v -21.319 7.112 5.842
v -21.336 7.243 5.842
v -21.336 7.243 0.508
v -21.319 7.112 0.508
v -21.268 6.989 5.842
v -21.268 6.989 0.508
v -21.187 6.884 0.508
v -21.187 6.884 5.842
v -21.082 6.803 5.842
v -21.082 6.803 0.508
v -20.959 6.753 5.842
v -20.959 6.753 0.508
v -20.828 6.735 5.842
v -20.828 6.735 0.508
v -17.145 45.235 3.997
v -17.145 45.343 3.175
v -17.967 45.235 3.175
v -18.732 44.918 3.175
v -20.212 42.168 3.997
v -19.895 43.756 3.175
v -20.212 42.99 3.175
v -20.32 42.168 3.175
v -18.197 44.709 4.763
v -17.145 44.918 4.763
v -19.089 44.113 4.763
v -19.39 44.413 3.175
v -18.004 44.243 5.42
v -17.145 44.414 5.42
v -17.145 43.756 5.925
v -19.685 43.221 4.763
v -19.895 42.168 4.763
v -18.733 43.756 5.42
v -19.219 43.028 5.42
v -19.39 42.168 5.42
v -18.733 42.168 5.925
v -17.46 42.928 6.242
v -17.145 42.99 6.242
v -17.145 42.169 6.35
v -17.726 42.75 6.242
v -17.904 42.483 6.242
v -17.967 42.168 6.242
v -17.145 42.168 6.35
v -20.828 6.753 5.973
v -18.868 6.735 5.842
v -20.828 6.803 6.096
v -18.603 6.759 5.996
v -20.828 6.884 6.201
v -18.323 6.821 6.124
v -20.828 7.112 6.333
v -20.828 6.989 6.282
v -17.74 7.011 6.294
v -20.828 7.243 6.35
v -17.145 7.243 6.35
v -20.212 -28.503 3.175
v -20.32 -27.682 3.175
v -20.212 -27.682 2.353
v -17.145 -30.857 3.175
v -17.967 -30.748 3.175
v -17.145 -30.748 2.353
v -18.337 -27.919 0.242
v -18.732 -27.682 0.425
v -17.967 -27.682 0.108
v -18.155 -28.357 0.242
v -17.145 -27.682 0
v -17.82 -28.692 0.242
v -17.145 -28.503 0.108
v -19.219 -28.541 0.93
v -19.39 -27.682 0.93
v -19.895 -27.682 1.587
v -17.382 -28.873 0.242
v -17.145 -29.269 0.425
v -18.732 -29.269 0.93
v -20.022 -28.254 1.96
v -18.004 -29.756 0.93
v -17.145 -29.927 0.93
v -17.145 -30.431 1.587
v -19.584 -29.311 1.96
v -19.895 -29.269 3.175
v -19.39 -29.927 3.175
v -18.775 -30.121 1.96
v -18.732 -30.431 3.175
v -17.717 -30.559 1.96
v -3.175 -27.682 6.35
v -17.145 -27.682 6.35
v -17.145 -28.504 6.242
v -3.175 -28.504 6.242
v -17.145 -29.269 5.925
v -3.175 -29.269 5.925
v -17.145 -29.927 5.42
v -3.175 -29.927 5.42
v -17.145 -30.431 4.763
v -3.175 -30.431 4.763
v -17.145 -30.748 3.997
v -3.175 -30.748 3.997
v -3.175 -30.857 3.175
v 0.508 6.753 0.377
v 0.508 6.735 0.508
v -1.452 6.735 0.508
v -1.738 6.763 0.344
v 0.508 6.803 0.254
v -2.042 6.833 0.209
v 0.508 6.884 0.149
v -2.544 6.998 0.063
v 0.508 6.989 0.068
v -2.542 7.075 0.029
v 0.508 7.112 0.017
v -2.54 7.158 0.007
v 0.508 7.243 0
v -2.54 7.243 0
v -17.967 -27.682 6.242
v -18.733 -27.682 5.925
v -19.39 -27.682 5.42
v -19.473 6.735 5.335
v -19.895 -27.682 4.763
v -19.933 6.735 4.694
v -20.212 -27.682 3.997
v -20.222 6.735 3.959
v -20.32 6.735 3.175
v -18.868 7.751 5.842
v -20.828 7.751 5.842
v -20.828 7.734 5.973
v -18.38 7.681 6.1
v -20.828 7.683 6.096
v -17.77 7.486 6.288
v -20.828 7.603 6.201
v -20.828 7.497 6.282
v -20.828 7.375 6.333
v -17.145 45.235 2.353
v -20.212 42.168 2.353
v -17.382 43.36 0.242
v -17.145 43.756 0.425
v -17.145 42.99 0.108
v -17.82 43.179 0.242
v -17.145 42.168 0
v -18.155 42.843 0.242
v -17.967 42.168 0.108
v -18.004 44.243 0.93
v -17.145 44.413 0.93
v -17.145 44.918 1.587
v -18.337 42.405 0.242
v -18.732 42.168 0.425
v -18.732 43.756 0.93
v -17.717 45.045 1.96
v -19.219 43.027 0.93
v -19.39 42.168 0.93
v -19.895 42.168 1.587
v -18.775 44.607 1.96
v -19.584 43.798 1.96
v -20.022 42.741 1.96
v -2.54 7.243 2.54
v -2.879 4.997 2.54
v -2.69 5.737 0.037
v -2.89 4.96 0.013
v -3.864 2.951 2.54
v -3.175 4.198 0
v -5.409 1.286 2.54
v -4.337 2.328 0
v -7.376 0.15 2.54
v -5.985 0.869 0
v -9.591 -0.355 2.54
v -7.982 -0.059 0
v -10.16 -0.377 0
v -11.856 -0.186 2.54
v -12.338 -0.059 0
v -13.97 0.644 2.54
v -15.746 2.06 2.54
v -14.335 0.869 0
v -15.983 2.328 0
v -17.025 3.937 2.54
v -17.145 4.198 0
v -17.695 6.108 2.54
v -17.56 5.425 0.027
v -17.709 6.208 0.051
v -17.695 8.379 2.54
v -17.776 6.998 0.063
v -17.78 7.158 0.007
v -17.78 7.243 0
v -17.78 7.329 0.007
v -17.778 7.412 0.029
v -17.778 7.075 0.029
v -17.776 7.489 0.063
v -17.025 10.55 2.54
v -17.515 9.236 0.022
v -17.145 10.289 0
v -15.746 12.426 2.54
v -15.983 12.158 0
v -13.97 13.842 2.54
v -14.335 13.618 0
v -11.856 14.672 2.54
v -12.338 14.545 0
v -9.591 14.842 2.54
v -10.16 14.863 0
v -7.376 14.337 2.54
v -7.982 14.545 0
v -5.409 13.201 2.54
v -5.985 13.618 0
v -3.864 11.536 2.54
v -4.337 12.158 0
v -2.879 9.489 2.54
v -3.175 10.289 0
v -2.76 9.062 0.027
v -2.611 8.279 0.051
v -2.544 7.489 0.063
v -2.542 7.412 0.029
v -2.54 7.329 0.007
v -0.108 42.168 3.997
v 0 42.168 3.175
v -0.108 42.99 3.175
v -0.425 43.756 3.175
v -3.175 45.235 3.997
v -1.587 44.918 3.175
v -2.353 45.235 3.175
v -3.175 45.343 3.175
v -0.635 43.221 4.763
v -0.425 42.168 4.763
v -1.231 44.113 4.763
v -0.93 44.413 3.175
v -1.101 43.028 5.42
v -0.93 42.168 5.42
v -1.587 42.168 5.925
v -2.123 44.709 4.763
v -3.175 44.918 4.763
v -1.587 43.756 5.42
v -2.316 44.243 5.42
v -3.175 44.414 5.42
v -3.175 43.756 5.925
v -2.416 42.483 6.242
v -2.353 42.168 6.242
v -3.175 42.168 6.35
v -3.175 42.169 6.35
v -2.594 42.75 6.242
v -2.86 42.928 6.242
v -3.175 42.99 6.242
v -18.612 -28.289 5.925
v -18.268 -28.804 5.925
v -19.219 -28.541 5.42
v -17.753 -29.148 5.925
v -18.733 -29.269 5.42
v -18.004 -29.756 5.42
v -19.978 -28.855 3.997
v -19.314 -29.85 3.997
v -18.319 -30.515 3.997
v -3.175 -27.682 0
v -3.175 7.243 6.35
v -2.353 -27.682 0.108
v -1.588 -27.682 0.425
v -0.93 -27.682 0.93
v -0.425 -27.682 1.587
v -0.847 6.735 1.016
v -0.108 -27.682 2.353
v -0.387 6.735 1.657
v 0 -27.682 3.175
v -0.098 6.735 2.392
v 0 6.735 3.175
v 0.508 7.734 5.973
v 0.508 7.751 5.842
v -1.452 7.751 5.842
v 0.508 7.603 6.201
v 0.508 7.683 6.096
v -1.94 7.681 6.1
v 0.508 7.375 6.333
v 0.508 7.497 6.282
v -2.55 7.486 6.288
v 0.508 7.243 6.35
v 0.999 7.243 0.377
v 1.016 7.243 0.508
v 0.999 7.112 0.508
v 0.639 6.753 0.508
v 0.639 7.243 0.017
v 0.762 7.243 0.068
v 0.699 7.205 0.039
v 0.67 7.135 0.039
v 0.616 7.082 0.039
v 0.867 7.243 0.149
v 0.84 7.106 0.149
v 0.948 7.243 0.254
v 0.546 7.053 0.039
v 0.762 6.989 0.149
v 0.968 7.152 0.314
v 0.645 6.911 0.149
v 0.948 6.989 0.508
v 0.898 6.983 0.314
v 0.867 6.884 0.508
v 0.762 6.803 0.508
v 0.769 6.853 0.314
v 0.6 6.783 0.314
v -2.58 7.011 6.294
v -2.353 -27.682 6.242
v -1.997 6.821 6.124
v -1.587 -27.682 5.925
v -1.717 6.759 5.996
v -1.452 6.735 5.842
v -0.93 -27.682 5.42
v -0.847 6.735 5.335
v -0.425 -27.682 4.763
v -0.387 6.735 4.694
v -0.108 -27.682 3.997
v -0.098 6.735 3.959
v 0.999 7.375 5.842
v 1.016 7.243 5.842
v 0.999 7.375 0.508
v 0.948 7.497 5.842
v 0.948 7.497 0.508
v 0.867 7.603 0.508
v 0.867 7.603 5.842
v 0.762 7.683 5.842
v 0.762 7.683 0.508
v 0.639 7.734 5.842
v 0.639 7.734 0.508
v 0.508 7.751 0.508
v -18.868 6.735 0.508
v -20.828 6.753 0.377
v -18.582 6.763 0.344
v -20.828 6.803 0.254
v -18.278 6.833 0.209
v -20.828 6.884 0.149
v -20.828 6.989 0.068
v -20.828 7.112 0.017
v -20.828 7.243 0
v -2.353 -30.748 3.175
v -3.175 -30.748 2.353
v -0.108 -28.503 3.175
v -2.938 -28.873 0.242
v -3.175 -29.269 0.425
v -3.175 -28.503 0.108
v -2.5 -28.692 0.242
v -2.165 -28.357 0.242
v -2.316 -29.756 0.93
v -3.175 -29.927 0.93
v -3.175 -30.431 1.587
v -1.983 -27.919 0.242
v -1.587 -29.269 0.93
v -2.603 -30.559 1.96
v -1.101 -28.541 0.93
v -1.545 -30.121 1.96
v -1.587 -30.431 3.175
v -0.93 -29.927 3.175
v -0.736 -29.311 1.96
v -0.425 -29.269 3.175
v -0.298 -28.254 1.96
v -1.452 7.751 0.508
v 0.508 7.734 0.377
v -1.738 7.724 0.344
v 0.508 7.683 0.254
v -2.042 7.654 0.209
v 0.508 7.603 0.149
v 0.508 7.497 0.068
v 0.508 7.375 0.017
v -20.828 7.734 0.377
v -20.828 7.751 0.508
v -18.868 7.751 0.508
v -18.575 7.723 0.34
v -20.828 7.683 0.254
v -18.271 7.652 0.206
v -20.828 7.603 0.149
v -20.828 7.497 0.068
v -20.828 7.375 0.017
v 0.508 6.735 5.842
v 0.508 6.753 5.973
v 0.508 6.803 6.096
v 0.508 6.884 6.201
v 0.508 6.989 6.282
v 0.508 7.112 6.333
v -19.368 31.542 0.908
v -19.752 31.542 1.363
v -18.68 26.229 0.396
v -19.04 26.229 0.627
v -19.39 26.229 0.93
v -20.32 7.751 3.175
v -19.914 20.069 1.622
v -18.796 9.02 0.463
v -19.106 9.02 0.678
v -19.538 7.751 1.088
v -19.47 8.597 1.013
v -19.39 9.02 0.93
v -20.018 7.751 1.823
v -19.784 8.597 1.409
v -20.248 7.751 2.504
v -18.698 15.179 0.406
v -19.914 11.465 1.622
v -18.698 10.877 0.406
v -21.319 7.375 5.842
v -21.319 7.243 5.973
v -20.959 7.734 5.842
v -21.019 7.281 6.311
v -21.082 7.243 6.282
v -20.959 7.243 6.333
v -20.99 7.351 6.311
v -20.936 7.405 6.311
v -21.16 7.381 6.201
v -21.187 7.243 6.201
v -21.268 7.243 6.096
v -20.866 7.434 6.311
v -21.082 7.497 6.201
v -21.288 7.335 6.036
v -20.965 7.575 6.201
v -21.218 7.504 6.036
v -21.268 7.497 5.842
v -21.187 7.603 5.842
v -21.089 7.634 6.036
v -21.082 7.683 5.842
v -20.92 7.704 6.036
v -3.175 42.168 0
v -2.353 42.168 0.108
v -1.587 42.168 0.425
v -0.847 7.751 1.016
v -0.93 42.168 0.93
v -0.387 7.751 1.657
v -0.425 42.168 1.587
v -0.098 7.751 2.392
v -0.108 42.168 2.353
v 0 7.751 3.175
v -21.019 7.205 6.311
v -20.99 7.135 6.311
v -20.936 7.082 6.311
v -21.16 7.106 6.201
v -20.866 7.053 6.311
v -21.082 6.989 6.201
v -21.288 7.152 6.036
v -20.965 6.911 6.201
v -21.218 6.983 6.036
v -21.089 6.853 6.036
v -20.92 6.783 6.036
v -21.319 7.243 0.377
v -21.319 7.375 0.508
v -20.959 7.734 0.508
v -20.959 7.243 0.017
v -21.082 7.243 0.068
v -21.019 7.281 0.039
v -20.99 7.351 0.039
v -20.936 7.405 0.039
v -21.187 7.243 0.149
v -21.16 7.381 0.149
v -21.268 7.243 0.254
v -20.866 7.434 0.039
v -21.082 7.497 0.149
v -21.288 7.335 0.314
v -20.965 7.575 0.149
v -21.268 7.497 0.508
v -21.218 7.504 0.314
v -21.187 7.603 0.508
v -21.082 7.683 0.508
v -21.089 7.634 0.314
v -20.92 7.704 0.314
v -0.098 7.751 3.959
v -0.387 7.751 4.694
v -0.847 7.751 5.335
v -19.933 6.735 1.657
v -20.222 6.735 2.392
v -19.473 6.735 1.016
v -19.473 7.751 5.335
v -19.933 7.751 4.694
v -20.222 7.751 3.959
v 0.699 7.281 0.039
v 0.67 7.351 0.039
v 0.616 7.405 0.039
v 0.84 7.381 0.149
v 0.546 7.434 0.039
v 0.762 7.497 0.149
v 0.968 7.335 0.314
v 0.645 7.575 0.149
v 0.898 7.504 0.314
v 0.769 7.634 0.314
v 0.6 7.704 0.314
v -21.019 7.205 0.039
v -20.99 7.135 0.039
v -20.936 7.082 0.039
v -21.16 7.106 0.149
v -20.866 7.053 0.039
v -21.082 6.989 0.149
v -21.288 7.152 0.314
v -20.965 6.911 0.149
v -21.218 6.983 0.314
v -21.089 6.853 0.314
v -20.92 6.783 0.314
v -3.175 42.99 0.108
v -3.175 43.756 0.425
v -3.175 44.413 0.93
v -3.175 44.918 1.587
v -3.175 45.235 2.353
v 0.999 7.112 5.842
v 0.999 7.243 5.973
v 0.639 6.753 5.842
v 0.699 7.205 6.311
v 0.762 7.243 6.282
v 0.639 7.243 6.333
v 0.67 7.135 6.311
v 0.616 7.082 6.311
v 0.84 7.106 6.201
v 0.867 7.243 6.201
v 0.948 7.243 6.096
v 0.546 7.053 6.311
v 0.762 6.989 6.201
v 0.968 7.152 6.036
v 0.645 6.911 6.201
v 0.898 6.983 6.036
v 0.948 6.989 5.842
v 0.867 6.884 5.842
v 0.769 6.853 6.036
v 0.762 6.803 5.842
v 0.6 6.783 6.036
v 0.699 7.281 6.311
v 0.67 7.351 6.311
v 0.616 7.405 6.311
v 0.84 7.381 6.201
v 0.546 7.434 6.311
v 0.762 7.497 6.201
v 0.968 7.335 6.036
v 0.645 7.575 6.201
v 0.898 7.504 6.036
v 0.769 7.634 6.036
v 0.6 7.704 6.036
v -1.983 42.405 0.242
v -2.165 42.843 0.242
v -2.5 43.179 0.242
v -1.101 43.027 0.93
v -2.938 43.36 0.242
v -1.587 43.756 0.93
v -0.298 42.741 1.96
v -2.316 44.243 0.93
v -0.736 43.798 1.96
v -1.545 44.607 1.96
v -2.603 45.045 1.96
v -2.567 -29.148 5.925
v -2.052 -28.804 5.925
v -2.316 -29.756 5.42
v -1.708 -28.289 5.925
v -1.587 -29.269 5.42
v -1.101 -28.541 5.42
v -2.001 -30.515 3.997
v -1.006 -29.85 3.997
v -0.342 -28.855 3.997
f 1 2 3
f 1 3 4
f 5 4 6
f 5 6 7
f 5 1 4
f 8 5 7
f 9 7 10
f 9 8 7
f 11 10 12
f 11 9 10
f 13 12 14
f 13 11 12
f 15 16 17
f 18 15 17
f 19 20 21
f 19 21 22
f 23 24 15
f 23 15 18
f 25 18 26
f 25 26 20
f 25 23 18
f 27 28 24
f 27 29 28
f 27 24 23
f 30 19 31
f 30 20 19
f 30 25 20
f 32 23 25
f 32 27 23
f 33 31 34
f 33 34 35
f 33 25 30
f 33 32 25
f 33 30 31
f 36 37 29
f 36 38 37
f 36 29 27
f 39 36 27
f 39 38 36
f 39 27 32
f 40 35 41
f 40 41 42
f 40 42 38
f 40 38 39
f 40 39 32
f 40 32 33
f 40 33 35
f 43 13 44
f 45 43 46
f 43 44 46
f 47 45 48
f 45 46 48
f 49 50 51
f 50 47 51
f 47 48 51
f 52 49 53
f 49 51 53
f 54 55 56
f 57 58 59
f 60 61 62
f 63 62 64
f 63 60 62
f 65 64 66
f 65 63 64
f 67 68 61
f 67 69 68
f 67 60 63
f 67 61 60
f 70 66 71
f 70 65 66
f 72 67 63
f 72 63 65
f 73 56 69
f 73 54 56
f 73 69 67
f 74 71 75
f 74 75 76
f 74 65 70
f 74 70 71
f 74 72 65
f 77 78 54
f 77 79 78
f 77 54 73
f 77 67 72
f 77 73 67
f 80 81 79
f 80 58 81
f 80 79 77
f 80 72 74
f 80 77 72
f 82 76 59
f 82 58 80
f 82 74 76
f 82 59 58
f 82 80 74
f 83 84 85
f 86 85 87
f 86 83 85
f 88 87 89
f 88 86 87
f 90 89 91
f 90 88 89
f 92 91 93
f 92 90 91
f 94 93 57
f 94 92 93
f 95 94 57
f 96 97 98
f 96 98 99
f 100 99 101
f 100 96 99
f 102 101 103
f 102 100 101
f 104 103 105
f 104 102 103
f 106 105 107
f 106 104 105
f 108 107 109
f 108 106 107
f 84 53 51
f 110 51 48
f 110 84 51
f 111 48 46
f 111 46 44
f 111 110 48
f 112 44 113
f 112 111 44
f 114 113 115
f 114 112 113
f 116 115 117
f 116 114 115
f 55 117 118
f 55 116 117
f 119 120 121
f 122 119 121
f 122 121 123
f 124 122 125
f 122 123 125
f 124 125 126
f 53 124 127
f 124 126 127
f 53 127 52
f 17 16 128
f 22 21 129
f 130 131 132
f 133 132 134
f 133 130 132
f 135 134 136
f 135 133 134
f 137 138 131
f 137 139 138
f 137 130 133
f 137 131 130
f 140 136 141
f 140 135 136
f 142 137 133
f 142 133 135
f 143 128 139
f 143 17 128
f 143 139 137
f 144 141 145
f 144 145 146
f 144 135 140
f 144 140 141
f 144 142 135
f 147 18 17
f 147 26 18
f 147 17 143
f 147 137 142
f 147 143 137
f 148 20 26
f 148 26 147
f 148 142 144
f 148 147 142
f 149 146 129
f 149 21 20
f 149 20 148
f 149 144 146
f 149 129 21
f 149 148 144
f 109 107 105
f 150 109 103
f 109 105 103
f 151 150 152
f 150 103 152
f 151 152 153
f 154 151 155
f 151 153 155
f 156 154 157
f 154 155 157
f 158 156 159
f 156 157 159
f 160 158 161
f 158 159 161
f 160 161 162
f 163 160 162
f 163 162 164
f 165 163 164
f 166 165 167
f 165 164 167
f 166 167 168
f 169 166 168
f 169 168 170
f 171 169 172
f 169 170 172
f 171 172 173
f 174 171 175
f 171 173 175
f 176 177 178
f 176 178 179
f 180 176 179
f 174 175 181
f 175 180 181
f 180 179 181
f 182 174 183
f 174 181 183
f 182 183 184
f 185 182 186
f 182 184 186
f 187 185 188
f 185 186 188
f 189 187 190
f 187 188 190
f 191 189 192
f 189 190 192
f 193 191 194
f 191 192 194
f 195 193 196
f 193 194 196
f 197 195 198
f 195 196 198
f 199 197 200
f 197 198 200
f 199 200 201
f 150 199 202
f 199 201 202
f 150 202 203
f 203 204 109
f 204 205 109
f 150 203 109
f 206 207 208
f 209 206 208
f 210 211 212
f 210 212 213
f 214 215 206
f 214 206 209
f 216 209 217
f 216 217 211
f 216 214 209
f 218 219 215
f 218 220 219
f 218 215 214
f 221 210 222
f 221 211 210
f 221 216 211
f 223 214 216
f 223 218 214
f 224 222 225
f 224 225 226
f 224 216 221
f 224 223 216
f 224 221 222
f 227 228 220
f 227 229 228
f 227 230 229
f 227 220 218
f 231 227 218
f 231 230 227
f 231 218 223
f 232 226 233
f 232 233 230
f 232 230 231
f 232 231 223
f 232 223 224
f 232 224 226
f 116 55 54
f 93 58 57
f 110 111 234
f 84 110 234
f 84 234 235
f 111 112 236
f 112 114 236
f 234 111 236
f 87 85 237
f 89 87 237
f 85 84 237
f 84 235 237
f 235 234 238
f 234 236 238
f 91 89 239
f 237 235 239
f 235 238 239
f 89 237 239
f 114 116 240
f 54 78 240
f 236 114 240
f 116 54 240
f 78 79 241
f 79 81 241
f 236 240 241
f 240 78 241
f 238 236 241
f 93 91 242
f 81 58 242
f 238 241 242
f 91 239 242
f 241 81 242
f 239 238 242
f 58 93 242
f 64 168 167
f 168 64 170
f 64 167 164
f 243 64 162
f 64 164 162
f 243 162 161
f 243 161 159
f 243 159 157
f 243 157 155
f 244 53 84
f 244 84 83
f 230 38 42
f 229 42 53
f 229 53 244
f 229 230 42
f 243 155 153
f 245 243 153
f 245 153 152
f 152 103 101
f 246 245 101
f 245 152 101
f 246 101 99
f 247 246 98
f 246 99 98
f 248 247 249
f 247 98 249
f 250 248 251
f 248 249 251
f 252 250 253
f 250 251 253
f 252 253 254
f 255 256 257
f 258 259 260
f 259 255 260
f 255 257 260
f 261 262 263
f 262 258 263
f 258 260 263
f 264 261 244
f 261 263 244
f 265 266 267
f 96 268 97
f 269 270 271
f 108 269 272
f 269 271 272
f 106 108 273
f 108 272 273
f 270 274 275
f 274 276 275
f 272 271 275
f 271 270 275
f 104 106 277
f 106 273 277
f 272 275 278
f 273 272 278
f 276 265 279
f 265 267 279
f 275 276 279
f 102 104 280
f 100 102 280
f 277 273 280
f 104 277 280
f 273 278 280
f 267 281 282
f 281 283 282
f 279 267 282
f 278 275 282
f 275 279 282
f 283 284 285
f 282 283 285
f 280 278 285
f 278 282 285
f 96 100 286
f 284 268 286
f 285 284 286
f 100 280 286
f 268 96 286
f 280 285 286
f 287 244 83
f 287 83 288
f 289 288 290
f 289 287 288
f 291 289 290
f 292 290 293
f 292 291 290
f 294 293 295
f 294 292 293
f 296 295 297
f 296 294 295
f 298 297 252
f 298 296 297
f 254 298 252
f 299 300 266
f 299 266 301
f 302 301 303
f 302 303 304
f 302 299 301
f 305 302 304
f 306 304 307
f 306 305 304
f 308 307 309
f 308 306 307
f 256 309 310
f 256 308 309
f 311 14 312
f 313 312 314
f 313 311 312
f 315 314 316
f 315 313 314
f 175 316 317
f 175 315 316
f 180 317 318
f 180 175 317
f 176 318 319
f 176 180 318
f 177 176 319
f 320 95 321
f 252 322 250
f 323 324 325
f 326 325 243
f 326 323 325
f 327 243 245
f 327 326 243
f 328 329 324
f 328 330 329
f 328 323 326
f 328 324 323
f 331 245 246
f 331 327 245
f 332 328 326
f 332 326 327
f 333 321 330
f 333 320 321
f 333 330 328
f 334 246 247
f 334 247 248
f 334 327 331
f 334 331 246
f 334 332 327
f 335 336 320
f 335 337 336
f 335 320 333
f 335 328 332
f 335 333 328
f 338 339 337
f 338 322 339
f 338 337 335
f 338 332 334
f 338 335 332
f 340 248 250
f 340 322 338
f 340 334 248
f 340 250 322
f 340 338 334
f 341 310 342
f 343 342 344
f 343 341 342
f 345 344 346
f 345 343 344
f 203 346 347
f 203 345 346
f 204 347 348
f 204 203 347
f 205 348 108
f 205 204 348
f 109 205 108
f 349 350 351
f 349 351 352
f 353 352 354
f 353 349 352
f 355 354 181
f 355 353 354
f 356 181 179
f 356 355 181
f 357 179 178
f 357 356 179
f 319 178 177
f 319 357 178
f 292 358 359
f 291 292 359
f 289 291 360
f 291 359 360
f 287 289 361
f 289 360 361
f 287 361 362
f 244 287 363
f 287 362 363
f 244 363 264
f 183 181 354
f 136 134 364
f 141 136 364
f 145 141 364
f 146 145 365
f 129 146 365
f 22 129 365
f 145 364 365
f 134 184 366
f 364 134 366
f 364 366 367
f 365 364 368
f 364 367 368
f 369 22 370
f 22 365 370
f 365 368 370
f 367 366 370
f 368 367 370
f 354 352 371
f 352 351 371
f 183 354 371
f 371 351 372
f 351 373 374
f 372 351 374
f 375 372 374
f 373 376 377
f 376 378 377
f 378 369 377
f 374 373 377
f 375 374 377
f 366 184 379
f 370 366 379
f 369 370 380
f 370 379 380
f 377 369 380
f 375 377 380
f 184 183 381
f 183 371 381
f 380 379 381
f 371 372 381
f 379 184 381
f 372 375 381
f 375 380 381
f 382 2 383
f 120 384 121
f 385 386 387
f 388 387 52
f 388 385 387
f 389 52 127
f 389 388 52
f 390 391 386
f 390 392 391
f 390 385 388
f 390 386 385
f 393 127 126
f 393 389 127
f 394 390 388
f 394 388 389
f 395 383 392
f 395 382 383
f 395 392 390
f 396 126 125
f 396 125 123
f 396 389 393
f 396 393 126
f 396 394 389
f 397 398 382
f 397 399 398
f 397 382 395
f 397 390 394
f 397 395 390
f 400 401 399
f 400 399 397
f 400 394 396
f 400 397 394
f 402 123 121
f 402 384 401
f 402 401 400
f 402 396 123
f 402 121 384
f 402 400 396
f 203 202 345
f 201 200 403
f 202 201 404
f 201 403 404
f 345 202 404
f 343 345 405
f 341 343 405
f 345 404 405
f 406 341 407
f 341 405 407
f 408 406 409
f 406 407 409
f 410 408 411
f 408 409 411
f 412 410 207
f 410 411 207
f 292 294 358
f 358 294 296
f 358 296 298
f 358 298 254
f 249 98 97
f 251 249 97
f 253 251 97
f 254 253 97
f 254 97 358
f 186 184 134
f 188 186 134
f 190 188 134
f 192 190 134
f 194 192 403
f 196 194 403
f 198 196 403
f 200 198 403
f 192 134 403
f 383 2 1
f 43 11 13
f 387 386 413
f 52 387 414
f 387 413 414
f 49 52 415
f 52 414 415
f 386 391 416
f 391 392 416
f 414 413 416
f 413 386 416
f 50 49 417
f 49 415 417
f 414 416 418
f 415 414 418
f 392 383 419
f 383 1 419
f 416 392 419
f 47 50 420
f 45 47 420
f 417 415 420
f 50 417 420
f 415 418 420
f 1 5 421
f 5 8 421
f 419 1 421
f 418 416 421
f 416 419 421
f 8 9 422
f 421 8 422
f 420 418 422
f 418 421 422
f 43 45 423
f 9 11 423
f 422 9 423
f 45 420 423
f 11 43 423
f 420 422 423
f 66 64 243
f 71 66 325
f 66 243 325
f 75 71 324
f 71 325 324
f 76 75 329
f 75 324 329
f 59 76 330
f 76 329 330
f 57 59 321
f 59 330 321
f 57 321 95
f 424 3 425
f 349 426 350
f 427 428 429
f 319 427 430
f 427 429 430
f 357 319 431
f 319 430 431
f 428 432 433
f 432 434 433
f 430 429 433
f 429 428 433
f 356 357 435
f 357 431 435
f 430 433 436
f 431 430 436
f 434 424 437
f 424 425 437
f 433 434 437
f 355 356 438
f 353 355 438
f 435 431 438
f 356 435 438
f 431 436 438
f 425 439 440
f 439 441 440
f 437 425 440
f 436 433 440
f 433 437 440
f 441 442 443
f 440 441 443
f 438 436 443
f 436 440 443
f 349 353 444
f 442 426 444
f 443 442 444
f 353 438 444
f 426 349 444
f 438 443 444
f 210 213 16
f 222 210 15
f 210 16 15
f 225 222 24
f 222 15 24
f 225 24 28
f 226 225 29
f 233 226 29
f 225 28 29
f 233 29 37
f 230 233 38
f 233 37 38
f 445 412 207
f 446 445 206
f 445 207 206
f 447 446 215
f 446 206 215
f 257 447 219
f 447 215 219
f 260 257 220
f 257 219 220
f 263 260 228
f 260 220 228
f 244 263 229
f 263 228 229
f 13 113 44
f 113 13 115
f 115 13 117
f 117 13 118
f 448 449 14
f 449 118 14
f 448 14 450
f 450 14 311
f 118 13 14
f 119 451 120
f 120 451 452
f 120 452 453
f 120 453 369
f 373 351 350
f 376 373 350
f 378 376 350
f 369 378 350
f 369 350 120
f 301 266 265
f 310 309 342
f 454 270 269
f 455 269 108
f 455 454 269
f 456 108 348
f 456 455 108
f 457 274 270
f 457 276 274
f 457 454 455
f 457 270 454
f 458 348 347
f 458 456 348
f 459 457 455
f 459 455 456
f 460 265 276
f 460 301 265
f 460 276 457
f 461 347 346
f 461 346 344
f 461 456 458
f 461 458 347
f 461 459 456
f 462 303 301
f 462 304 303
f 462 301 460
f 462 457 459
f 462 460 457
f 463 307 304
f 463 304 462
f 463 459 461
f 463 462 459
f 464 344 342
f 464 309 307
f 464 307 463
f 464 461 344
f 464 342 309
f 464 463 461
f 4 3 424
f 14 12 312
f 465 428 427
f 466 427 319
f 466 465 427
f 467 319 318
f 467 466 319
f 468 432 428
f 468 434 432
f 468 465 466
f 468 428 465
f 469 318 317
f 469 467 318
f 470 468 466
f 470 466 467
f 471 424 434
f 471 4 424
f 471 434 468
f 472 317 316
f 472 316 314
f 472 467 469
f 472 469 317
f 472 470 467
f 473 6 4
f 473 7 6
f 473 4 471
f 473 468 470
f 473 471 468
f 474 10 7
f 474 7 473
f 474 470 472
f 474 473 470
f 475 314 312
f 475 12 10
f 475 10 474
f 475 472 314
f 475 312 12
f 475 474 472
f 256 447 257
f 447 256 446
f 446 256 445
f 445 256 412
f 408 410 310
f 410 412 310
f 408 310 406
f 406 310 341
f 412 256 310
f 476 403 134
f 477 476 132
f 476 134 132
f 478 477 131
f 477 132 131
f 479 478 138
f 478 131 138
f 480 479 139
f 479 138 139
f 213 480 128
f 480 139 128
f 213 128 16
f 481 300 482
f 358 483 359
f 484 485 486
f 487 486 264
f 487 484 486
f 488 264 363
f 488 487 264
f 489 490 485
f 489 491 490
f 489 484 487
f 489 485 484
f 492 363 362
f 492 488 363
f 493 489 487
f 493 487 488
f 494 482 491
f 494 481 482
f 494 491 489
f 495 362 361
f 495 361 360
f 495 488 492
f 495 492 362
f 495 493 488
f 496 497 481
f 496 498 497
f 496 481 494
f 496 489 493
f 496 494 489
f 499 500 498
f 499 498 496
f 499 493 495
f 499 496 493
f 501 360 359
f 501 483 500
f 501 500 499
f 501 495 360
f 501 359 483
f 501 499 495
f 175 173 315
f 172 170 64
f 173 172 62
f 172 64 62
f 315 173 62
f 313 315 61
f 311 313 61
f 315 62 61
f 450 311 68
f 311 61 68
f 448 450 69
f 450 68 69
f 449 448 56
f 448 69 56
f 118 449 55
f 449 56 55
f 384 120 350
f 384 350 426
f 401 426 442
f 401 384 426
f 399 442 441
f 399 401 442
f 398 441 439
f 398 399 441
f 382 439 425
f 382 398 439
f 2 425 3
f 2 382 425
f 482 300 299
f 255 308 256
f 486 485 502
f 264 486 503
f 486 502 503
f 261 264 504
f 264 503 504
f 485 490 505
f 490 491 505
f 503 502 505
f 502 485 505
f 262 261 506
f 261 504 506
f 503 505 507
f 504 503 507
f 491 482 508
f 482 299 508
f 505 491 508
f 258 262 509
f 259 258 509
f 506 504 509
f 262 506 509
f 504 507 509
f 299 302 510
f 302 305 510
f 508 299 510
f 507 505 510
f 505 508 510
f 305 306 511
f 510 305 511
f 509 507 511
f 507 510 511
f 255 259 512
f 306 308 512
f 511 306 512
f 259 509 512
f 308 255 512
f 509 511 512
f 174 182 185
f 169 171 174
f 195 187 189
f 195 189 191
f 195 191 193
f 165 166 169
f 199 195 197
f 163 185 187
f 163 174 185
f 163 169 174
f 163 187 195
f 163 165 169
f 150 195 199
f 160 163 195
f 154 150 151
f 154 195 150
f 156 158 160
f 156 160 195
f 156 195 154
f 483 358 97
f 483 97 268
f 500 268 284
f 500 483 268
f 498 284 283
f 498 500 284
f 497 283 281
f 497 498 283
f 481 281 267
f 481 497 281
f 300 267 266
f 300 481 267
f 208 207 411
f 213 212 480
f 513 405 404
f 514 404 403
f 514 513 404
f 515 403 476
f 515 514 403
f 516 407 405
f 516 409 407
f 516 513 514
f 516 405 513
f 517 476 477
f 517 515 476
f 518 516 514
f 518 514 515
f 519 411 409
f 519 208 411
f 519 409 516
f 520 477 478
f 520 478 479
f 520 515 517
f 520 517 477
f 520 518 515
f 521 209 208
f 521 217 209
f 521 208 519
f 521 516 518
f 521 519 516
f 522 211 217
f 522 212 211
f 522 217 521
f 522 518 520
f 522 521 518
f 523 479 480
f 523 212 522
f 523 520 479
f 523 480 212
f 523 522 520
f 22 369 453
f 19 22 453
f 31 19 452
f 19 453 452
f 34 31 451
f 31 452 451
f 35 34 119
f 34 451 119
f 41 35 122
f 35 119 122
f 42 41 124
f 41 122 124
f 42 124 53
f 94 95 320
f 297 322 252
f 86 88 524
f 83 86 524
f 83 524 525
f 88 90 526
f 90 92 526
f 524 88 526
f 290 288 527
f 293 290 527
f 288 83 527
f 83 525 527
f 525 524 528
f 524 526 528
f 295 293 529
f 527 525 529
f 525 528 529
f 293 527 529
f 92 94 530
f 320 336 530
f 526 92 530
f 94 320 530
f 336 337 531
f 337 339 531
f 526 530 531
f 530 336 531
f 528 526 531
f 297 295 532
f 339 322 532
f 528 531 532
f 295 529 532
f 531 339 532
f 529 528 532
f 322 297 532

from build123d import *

# Parameters (mm, degrees)
F1_DEPTH = 6.35
F2_R     = 0.50799
F3_F1_R  = 3.175
F3_F2_R  = 3.175
F3_F3_R  = 3.175
F3_F4_R  = 3.175
F3_F5_R  = 3.175
F3_F6_R  = 3.175
F3_F7_R  = 3.1746
F3_F8_R  = 3.1746
F4_R     = 7.62
F5_DEPTH = 2.54


# Not quite as in the source:
# - a fillet or chamfer is up to 0.001 mm smaller than in the source, because OpenCascade refuses the exact size


with BuildPart() as f1:
    # F0 (on Top) → F1 (new body)
    with BuildSketch(Plane.XY):
        Polygon((0, 7.7513456765), (0, 45.3433456765), (-20.32, 45.3433456765), (-20.32, 7.7513456765), (-21.336, 7.7513456765), (-21.336, 6.7353456765), (-20.32, 6.7353456765), (-20.32, -30.8566543235), (0, -30.8566543235), (0, 6.7353456765), (1.016, 6.7353456765), (1.016, 7.7513456765), align=None)
    extrude(amount=F1_DEPTH)

    # F2 (radius 0.508 in the source; OpenCascade refuses exactly that, so slightly less here)
    f2_edges = [f1.edges().sort_by_distance(p)[0] for p in [
        (1.016, 6.735346, 3.175),
        (1.016, 7.751346, 3.175),
        (1.016, 7.243346, 0),
        (1.016, 7.243346, 6.35),
        (0.508, 7.751346, 6.35),
        (0.508, 6.735346, 6.35),
        (0.508, 6.735346, 0),
        (0.508, 7.751346, 0),
        (-21.336, 7.751346, 3.175),
        (-21.336, 6.735346, 3.175),
        (-21.336, 7.243346, 0),
        (-21.336, 7.243346, 6.35),
        (-20.828, 7.751346, 6.35),
        (-20.828, 6.735346, 6.35),
        (-20.828, 7.751346, 0),
        (-20.828, 6.735346, 0),
    ]]
    fillet(f2_edges, radius=F2_R)

    # F3: fillet of radius 3.175 on 16 edges, made by hand

    # F3_f1
    f3_f1_edges = [f1.edges().sort_by_distance(p)[0] for p in [
        (0, -30.8566543235, 3.175),
    ]]
    fillet(f3_f1_edges, radius=F3_F1_R)

    # F3_f2
    f3_f2_edges = [f1.edges().sort_by_distance(p)[0] for p in [
        (-20.32, -30.8566543235, 3.175),
    ]]
    fillet(f3_f2_edges, radius=F3_F2_R)

    # F3_f3
    f3_f3_edges = [f1.edges().sort_by_distance(p)[0] for p in [
        (0, 45.3433456765, 3.175),
    ]]
    fillet(f3_f3_edges, radius=F3_F3_R)

    # F3_f4
    f3_f4_edges = [f1.edges().sort_by_distance(p)[0] for p in [
        (-20.32, 45.3433456765, 3.175),
    ]]
    fillet(f3_f4_edges, radius=F3_F4_R)

    # F3_f5
    f3_f5_edges = [f1.edges().sort_by_distance(p)[0] for p in [
        (-10.16, -30.8566543235, 0),
    ]]
    fillet(f3_f5_edges, radius=F3_F5_R)

    # F3_f6
    f3_f6_edges = [f1.edges().sort_by_distance(p)[0] for p in [
        (-10.16, 45.3433456765, 0),
    ]]
    fillet(f3_f6_edges, radius=F3_F6_R)

    # F3_f7 (radius 3.175 in the source; OpenCascade refuses exactly that, so slightly less here)
    f3_f7_edges = [f1.edges().sort_by_distance(p)[0] for p in [
        (-10.16, 45.3433456765, 6.35),
    ]]
    fillet(f3_f7_edges, radius=F3_F7_R)

    # F3_f8 (radius 3.175 in the source; OpenCascade refuses exactly that, so slightly less here)
    f3_f8_edges = [f1.edges().sort_by_distance(p)[0] for p in [
        (-10.16, -30.8566543235, 6.35),
    ]]
    fillet(f3_f8_edges, radius=F3_F8_R)

    # F4 (on face) → F5 (cut)
    with BuildSketch(Plane(origin=(0, 0, 0), x_dir=(1, 0, 0), z_dir=(0, 0, -1))):
        with Locations((-10.16, -7.2433456765)):
            Circle(F4_R)
    extrude(amount=-F5_DEPTH, mode=Mode.SUBTRACT)


solid = f1.part
